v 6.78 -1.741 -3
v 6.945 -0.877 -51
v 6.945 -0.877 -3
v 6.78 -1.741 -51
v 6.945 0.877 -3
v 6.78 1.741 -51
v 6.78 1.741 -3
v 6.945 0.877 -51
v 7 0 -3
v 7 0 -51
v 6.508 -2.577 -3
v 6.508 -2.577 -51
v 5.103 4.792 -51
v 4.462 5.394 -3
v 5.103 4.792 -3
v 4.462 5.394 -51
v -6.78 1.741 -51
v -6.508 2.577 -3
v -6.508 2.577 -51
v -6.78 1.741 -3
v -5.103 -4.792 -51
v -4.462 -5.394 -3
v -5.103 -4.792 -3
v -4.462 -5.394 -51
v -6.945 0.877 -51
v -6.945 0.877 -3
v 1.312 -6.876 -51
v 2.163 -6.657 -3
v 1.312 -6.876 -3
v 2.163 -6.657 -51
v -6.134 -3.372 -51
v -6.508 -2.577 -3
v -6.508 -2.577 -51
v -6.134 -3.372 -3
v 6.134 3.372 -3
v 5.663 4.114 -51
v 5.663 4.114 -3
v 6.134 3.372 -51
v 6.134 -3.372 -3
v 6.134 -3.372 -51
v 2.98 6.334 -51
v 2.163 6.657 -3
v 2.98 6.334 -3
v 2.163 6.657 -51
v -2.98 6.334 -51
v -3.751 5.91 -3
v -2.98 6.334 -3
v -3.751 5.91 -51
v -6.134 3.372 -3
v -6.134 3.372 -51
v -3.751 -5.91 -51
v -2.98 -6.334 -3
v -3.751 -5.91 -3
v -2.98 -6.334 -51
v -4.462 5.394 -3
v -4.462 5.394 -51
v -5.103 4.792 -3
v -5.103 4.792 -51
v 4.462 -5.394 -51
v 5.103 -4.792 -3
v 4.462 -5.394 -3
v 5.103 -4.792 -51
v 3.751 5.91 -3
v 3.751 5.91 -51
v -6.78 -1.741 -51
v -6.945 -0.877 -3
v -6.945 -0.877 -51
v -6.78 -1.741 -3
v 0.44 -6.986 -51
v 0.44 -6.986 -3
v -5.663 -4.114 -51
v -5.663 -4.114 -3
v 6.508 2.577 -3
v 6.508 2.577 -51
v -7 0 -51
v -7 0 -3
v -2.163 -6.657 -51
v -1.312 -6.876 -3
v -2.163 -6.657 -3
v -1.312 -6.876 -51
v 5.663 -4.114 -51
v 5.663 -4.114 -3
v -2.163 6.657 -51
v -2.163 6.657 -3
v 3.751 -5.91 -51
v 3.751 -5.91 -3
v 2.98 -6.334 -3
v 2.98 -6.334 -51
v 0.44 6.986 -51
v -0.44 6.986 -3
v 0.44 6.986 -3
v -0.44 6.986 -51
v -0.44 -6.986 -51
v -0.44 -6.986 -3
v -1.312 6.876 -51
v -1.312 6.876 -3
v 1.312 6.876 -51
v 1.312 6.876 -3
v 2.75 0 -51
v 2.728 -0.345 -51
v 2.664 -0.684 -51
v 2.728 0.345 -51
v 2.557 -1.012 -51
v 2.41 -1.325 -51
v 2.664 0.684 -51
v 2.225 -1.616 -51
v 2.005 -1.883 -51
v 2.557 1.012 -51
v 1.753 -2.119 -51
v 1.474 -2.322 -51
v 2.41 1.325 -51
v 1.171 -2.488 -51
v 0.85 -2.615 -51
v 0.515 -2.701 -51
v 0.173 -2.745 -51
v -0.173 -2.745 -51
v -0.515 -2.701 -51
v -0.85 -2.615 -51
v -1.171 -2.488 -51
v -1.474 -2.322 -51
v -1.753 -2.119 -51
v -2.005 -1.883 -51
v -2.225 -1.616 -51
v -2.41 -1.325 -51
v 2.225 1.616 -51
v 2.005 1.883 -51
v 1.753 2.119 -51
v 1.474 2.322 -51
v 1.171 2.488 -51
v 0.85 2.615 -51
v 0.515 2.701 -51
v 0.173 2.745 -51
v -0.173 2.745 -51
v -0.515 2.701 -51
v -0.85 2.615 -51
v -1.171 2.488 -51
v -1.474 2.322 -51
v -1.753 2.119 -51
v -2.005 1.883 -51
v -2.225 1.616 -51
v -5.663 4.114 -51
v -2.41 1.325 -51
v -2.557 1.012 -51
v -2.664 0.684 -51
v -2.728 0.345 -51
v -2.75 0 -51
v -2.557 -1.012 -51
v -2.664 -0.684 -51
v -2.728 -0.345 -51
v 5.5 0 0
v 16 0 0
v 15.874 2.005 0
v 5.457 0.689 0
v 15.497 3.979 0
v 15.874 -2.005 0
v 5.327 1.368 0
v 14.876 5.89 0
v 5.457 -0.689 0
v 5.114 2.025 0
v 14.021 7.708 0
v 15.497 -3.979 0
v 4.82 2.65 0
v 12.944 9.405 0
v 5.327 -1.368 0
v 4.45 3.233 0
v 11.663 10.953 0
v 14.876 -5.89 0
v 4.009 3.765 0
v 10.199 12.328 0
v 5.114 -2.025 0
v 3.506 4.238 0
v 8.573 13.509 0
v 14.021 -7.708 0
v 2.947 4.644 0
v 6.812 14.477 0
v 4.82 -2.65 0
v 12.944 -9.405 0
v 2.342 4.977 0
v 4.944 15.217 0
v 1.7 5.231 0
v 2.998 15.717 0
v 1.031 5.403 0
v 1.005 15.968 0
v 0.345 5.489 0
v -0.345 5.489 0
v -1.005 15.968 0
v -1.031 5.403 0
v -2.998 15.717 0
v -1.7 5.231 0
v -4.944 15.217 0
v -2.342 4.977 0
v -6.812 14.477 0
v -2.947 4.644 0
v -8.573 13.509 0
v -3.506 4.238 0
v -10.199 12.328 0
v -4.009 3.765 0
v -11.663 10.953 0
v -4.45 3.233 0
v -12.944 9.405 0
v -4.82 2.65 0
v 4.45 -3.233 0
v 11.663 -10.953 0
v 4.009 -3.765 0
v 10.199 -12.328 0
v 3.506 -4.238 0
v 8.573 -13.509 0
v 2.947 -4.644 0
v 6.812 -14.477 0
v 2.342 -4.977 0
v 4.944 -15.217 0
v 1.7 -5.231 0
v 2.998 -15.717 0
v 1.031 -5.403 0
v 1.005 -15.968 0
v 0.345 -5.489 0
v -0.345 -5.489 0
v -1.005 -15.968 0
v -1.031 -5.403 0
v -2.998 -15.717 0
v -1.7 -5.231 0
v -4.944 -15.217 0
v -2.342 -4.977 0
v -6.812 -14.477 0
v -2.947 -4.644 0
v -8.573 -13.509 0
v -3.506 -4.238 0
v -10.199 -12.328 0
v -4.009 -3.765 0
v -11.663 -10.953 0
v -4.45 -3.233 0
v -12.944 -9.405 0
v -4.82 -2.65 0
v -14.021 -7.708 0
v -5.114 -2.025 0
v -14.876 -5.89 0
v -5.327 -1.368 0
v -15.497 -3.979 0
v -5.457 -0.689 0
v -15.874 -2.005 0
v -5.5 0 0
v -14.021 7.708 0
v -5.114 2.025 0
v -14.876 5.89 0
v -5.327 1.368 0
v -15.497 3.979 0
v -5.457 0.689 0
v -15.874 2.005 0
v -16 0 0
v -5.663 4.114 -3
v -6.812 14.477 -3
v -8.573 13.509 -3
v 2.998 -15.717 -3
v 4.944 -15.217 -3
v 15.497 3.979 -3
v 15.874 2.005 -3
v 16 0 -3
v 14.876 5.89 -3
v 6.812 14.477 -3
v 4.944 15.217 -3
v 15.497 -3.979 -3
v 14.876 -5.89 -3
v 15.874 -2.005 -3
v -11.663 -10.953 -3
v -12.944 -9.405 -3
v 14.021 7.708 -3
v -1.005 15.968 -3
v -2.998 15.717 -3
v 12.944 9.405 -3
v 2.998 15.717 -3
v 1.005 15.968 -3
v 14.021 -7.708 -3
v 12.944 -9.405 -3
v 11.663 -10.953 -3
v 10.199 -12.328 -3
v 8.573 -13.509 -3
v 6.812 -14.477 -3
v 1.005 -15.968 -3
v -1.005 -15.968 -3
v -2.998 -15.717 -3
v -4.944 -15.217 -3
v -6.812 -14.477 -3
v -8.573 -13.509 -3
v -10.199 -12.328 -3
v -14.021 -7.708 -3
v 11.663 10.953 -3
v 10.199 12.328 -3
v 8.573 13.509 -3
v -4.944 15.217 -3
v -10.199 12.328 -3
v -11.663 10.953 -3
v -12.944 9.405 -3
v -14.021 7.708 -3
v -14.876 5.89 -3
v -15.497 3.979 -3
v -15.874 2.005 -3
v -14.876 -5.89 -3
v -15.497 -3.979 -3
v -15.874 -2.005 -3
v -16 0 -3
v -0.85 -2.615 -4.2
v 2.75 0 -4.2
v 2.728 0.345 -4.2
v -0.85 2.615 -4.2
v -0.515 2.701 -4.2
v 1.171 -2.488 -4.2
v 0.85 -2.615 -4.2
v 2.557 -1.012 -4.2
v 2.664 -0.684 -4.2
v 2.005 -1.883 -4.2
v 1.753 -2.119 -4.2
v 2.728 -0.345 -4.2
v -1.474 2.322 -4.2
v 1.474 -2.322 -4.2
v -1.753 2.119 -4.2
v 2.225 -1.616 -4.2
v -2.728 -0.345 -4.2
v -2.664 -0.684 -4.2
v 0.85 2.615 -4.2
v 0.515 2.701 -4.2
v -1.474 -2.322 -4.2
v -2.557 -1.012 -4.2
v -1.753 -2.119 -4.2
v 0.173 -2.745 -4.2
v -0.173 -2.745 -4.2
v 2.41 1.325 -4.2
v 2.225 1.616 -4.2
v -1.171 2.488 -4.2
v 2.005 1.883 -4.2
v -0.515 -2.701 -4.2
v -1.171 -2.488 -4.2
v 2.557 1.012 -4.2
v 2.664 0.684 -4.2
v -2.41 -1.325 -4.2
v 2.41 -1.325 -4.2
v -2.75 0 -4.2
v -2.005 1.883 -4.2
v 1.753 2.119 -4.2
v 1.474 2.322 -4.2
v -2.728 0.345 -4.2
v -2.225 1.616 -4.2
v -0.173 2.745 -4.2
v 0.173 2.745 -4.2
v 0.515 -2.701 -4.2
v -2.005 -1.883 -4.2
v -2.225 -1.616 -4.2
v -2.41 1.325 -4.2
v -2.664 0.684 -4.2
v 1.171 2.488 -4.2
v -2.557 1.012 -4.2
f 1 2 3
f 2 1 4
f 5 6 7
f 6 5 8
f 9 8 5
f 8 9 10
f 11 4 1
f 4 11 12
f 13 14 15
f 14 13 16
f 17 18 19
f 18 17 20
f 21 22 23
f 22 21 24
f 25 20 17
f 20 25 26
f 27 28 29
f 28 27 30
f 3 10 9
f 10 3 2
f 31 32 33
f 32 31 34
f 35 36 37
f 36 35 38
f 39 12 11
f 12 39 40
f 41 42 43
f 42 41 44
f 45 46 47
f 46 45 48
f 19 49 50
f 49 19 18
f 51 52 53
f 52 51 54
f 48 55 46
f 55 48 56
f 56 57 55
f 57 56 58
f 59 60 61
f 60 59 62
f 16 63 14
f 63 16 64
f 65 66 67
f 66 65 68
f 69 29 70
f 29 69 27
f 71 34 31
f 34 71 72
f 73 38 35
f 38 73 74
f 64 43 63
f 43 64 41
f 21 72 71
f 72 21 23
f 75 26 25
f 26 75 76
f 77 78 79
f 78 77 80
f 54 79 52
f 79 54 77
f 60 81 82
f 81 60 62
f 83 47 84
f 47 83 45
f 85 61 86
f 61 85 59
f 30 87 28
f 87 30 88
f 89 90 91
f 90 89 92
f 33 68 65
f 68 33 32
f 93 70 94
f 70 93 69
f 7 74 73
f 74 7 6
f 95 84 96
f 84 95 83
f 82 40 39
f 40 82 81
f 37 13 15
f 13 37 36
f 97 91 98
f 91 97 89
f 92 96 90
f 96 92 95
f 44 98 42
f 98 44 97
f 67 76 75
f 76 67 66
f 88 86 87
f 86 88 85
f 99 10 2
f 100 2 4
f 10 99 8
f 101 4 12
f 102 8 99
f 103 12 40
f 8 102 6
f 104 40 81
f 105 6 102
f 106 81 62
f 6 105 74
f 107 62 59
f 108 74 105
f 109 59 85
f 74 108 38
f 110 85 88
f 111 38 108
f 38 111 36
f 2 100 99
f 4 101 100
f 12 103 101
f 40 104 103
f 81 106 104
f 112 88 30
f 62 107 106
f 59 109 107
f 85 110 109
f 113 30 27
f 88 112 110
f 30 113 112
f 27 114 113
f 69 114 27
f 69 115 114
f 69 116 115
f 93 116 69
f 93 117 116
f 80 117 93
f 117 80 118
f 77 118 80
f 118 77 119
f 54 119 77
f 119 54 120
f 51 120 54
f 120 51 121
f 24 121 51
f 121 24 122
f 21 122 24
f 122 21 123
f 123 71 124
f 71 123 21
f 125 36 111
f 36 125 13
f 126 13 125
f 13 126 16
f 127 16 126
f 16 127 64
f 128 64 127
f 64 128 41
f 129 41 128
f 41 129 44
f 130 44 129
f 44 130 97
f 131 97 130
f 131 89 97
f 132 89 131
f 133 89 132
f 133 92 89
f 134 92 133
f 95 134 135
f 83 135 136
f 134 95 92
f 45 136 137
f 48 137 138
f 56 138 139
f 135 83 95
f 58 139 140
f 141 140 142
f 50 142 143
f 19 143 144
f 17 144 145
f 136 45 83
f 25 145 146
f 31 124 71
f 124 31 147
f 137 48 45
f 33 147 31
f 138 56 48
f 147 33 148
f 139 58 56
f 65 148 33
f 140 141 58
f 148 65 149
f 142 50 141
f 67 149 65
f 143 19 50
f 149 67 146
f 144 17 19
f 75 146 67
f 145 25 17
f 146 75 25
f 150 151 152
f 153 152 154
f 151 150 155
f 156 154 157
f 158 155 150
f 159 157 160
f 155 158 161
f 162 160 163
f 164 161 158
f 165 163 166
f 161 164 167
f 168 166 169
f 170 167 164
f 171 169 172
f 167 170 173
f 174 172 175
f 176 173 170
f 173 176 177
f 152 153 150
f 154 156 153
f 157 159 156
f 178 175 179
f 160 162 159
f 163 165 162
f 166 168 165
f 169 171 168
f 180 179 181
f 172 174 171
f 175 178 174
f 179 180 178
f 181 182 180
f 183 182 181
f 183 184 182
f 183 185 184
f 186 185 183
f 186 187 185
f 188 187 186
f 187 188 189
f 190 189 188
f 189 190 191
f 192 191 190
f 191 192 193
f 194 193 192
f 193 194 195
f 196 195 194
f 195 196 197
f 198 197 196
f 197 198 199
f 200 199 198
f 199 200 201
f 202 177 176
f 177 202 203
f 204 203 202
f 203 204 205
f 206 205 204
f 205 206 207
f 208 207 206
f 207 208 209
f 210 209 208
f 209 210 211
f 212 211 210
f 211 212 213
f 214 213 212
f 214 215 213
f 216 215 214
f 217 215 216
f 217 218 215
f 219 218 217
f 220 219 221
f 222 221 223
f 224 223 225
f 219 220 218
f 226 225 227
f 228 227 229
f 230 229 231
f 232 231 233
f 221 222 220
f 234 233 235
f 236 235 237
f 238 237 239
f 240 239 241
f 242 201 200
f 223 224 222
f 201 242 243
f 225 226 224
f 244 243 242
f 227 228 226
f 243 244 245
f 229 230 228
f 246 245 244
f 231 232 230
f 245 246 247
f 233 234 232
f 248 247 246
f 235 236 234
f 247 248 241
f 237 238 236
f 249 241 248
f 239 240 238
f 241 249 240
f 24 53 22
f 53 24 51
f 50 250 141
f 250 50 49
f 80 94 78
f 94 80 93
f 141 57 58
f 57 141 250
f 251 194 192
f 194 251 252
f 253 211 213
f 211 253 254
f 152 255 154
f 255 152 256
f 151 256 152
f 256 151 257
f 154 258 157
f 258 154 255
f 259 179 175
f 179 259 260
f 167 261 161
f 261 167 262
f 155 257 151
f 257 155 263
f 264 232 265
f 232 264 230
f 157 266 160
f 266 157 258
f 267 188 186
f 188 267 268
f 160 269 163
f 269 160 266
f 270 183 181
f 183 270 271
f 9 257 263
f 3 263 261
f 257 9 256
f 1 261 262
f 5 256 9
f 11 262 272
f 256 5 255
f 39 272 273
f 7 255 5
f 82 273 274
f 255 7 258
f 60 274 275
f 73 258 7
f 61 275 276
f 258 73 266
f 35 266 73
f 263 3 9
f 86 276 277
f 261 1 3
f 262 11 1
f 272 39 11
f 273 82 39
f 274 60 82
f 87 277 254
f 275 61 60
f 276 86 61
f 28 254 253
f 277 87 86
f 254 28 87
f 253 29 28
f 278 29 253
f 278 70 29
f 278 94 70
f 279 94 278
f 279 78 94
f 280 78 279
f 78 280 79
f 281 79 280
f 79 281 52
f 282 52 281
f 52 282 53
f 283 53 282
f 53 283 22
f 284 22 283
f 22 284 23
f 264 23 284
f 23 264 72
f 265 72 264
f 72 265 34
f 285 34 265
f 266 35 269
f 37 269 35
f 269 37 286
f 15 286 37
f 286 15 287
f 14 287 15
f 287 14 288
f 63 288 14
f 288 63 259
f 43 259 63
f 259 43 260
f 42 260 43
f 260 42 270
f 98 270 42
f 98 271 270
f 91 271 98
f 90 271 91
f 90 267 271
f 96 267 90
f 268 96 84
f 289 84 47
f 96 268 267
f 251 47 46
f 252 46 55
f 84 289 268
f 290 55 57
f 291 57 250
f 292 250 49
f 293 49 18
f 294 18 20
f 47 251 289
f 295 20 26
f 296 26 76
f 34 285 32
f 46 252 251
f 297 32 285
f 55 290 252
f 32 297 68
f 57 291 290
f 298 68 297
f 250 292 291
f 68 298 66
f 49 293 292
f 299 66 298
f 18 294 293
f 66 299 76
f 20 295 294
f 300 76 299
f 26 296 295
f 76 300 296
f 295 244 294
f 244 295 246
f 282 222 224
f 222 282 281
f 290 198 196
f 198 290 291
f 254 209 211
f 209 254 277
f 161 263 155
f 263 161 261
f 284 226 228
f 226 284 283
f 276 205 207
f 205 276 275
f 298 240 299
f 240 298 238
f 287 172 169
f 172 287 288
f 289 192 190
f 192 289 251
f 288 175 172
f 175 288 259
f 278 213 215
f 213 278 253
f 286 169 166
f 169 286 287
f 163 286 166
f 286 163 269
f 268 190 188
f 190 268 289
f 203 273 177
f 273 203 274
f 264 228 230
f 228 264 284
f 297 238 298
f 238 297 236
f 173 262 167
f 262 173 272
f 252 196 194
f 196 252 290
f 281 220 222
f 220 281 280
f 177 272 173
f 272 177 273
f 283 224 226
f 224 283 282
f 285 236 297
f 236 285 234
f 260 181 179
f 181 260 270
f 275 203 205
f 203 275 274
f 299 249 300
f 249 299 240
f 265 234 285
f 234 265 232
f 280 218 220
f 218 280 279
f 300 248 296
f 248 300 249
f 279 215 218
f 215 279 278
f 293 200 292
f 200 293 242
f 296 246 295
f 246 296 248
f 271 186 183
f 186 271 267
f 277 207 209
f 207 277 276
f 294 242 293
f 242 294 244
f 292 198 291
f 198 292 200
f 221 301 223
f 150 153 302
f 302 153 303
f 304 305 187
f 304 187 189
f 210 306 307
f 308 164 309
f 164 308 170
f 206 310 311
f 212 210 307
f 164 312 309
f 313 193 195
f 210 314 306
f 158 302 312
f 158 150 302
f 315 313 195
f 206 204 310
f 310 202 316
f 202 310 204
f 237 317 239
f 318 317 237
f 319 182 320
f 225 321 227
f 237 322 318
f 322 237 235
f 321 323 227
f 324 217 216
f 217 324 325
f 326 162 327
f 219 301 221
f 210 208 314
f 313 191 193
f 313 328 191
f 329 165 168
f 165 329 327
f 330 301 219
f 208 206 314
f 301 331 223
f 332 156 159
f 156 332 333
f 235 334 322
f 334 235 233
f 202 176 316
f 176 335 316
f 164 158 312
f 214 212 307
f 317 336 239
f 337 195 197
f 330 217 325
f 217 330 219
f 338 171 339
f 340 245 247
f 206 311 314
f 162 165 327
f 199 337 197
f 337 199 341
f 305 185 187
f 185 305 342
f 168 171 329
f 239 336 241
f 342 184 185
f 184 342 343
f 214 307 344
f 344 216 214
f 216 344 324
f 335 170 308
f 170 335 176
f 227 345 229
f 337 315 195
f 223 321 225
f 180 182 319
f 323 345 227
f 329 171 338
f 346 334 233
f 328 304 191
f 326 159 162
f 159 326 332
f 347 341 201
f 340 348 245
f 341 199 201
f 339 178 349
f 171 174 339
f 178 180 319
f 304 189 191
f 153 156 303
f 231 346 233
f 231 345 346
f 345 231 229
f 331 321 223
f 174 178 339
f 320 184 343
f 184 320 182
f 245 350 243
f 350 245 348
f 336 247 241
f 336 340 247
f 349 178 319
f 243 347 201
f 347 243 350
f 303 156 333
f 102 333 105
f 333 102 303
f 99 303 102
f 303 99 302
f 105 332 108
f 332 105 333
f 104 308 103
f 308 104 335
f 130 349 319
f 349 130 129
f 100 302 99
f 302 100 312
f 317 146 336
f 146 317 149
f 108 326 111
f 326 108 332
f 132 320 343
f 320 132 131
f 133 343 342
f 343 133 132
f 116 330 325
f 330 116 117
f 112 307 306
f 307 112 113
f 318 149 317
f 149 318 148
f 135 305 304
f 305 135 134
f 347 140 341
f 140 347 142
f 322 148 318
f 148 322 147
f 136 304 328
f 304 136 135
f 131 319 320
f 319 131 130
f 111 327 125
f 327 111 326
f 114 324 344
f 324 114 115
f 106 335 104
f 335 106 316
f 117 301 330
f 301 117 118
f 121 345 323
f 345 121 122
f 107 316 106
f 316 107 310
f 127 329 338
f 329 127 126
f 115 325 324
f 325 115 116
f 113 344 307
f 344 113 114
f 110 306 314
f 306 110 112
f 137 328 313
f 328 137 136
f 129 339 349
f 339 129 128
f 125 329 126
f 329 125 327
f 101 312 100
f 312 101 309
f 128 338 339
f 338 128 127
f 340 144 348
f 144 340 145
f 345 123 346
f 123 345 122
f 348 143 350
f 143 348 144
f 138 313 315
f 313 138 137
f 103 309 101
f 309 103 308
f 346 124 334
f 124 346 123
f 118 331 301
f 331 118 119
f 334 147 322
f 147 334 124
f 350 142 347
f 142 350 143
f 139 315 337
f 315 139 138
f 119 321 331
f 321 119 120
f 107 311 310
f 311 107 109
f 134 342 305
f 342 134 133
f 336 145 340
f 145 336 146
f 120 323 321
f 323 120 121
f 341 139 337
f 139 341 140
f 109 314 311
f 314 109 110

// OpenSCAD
$fn = 50;


difference() {
	union() {
		translate(v = [0, 0, -51.0000000000]) {
			cylinder(h = 51, r = 7.0000000000);
		}
		translate(v = [0, 0, -3.0000000000]) {
			cylinder(h = 3, r = 16.0000000000);
		}
	}
	union() {
		translate(v = [0, 0, 0]) {
			rotate(a = [0, 0, 0]) {
				difference() {
					union() {
						#translate(v = [0, 0, -51.0000000000]) {
							cylinder(h = 51, r = 2.2500000000);
						}
						#translate(v = [0, 0, -4.2000000000]) {
							cylinder(h = 4.2000000000, r1 = 2.7500000000, r2 = 5.5000000000);
						}
						#translate(v = [0, 0, -51.0000000000]) {
							cylinder(h = 51, r = 2.7500000000);
						}
						#translate(v = [0, 0, -51.0000000000]) {
							cylinder(h = 51, r = 2.2500000000);
						}
					}
					union();
				}
			}
		}
	}
}
